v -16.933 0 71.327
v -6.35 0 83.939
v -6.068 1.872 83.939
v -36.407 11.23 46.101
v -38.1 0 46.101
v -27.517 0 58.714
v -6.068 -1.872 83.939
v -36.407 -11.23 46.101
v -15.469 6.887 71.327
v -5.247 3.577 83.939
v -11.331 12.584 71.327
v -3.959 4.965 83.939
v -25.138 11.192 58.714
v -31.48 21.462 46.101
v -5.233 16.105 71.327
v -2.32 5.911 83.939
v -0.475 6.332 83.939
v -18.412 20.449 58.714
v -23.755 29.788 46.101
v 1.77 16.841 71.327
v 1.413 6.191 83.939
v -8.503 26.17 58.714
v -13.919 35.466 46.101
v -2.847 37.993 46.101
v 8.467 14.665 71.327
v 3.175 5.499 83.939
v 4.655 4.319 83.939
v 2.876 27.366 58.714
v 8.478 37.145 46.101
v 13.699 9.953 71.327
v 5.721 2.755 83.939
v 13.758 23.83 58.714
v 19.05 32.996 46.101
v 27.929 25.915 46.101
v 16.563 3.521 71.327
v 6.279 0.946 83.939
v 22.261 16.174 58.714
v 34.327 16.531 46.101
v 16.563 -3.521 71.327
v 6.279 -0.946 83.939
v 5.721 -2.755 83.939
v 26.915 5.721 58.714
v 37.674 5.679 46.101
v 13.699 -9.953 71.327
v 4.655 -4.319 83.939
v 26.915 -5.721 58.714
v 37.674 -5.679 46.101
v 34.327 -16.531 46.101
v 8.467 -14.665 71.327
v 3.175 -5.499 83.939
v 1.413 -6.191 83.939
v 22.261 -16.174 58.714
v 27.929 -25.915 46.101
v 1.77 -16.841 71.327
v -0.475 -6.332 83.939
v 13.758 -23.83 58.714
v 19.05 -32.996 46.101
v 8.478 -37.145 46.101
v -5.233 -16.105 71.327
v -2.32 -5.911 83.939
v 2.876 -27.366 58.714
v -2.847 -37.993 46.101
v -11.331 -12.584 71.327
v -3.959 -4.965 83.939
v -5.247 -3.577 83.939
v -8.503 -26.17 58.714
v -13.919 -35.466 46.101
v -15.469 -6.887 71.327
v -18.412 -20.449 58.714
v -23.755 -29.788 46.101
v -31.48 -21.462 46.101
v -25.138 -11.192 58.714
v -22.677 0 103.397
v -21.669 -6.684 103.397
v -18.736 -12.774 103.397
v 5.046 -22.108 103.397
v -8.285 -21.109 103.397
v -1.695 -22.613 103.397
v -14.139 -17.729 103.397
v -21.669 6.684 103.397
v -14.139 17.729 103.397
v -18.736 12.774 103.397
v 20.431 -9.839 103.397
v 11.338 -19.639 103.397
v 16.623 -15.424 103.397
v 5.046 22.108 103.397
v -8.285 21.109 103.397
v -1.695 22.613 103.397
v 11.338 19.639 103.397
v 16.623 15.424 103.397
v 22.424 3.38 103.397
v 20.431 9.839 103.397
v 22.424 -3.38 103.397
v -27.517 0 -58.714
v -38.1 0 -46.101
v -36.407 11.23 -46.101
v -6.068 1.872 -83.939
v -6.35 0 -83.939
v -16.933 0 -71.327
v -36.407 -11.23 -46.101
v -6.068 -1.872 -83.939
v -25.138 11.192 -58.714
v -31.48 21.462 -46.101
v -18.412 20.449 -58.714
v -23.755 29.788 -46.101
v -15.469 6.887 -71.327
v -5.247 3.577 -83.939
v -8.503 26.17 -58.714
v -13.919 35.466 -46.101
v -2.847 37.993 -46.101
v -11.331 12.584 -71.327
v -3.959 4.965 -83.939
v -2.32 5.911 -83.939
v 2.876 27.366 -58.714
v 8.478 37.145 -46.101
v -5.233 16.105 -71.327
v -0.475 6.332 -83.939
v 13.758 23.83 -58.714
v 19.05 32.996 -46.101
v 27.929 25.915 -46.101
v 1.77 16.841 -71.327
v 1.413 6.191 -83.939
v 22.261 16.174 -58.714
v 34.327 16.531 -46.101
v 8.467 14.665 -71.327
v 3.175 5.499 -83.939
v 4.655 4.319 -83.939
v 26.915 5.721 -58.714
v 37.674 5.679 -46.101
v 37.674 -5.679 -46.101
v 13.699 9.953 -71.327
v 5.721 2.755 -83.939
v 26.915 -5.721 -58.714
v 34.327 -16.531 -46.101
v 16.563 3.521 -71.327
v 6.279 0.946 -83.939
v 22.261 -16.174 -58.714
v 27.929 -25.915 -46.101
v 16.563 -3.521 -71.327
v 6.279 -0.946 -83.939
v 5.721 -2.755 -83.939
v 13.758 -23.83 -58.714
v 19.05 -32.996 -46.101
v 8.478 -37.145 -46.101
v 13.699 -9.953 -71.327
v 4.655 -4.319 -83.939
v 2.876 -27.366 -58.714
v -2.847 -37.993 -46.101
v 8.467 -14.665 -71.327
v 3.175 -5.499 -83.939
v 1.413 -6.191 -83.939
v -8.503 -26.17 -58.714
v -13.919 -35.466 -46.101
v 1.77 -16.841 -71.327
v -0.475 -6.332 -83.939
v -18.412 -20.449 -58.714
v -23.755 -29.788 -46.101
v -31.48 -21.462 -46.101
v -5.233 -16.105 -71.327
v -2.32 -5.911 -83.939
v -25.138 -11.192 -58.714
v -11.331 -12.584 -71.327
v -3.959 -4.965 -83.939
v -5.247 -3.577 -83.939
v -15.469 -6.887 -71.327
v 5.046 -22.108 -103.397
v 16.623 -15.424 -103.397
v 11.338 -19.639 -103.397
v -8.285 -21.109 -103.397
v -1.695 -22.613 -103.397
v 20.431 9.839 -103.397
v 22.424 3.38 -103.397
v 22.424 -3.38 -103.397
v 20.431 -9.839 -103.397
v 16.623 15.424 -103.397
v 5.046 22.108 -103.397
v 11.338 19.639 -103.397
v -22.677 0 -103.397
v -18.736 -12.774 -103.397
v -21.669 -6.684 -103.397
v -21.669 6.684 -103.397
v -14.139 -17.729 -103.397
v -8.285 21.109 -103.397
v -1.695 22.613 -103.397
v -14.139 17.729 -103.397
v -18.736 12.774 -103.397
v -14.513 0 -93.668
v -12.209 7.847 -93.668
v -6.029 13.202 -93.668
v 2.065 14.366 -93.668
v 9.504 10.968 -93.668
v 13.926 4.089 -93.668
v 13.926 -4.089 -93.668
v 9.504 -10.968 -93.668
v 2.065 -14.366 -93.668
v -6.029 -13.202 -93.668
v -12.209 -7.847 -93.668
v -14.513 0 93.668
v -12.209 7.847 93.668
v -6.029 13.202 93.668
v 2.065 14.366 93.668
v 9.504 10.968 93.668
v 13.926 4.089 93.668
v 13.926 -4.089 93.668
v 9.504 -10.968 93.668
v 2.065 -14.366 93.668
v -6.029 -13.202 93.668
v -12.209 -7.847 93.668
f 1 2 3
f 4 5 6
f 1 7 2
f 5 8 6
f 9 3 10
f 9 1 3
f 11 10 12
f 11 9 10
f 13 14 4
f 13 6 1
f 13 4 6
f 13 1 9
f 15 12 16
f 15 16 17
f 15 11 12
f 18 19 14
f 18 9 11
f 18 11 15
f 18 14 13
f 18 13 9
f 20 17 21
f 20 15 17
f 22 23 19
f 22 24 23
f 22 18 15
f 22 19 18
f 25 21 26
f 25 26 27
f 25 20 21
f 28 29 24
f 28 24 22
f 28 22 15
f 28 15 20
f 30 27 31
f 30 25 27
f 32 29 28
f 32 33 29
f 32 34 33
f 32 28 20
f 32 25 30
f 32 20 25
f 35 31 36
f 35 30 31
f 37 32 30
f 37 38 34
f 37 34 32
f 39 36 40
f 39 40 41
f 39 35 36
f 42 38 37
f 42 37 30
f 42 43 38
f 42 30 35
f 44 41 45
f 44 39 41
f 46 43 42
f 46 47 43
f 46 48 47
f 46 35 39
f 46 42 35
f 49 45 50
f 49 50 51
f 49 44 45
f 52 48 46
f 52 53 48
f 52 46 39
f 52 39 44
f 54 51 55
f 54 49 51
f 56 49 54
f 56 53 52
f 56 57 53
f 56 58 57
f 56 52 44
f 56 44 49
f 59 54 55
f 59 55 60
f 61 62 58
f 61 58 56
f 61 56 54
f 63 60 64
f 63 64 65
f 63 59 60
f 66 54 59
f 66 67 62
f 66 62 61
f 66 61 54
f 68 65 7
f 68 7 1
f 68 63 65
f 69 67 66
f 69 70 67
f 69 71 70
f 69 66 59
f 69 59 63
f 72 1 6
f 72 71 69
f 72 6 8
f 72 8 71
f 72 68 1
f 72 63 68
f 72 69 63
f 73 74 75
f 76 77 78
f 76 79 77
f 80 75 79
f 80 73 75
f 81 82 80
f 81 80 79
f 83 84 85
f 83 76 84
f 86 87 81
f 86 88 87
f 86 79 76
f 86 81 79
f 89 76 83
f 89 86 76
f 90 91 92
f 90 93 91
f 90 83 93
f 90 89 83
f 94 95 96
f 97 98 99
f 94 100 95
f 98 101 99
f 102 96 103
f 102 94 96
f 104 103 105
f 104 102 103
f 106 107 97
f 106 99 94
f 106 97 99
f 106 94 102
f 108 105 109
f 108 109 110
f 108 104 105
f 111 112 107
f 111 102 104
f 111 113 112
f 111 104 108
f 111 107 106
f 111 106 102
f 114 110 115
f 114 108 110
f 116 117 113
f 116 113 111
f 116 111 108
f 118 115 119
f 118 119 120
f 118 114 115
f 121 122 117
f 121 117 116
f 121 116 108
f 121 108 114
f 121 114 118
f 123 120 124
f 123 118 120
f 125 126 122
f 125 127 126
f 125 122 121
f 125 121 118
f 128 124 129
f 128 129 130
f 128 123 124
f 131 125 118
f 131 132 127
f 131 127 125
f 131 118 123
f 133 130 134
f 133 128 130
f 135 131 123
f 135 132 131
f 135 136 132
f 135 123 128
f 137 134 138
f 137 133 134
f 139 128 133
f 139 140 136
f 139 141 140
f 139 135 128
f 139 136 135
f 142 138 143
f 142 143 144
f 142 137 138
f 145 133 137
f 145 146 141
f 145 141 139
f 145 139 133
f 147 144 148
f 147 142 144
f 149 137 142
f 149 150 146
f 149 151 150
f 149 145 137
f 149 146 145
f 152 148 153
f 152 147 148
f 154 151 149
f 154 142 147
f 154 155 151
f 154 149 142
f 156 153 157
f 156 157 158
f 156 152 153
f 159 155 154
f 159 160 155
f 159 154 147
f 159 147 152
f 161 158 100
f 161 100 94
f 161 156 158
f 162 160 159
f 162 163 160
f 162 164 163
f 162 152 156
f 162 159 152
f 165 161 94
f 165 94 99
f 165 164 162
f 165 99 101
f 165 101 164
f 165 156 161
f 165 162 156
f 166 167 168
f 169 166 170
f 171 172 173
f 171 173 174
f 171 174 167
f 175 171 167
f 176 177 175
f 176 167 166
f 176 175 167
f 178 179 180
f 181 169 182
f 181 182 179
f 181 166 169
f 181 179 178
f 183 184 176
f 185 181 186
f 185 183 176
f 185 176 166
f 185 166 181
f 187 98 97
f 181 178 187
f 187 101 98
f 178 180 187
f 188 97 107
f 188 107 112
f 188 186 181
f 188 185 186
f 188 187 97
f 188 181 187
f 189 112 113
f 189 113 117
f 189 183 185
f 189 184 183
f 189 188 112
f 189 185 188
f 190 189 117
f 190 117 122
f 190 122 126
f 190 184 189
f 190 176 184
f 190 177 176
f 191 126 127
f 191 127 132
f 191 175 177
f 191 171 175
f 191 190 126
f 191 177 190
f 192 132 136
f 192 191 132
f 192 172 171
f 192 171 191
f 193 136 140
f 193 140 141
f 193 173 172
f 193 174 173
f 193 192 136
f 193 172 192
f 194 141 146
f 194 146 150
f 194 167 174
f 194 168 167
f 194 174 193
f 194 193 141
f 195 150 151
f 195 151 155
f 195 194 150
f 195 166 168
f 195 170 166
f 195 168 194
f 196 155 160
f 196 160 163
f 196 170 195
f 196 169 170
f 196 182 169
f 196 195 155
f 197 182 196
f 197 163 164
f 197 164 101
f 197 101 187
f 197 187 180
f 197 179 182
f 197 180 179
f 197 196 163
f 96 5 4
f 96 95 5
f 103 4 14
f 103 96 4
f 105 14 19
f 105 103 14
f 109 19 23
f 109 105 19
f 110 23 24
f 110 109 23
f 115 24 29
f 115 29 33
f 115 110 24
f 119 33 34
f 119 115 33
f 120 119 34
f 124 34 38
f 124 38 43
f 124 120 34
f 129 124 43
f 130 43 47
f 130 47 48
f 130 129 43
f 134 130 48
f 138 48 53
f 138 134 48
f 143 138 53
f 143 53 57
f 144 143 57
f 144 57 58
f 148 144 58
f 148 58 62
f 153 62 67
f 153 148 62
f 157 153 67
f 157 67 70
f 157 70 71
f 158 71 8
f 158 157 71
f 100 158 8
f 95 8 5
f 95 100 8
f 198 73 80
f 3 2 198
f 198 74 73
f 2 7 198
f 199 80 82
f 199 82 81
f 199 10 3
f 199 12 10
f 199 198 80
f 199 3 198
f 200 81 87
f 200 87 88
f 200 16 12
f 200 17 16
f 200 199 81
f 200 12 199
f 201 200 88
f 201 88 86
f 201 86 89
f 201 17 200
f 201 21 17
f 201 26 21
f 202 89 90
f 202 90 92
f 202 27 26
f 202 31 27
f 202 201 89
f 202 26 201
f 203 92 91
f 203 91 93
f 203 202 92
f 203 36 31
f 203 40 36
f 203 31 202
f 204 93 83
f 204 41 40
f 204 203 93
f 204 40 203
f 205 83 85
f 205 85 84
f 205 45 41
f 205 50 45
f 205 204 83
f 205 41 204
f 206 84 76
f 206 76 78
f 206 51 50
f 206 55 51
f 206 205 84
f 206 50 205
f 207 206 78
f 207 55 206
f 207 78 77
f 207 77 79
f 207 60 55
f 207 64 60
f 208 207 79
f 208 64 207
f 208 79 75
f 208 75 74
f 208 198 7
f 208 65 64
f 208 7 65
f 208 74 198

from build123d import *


# Not quite as in the source:
# - a feature of the source that left no trace in its solid (it failed there, or was rolled back) is left out


with BuildPart() as f1:
    # F0 (on Front) → F1 (revolve)
    with BuildSketch(Plane.XZ):
        Polygon((-38.1, 46.1013156182), (-38.1, 0), (-38.1, -46.1013156182), (-6.35, -83.9394921831), (0, -91.5071274961), (0, 83.9394921831), (-6.35, 83.9394921831), align=None)
        Polygon((-22.676805286, 103.3970210383), (-6.35, 83.9394921831), (0, 91.5071274961), (0, 103.3970210383), align=None)
        Polygon((0, 91.5071274961), (-6.35, 83.9394921831), (0, 83.9394921831), align=None)
        Polygon((0, -91.5071274961), (-6.35, -83.9394921831), (-22.676805286, -103.3970210383), (0, -103.3970210383), align=None)
    revolve(axis=Axis((0, 0, 0), (0, 0, -1)))


solid = f1.part
